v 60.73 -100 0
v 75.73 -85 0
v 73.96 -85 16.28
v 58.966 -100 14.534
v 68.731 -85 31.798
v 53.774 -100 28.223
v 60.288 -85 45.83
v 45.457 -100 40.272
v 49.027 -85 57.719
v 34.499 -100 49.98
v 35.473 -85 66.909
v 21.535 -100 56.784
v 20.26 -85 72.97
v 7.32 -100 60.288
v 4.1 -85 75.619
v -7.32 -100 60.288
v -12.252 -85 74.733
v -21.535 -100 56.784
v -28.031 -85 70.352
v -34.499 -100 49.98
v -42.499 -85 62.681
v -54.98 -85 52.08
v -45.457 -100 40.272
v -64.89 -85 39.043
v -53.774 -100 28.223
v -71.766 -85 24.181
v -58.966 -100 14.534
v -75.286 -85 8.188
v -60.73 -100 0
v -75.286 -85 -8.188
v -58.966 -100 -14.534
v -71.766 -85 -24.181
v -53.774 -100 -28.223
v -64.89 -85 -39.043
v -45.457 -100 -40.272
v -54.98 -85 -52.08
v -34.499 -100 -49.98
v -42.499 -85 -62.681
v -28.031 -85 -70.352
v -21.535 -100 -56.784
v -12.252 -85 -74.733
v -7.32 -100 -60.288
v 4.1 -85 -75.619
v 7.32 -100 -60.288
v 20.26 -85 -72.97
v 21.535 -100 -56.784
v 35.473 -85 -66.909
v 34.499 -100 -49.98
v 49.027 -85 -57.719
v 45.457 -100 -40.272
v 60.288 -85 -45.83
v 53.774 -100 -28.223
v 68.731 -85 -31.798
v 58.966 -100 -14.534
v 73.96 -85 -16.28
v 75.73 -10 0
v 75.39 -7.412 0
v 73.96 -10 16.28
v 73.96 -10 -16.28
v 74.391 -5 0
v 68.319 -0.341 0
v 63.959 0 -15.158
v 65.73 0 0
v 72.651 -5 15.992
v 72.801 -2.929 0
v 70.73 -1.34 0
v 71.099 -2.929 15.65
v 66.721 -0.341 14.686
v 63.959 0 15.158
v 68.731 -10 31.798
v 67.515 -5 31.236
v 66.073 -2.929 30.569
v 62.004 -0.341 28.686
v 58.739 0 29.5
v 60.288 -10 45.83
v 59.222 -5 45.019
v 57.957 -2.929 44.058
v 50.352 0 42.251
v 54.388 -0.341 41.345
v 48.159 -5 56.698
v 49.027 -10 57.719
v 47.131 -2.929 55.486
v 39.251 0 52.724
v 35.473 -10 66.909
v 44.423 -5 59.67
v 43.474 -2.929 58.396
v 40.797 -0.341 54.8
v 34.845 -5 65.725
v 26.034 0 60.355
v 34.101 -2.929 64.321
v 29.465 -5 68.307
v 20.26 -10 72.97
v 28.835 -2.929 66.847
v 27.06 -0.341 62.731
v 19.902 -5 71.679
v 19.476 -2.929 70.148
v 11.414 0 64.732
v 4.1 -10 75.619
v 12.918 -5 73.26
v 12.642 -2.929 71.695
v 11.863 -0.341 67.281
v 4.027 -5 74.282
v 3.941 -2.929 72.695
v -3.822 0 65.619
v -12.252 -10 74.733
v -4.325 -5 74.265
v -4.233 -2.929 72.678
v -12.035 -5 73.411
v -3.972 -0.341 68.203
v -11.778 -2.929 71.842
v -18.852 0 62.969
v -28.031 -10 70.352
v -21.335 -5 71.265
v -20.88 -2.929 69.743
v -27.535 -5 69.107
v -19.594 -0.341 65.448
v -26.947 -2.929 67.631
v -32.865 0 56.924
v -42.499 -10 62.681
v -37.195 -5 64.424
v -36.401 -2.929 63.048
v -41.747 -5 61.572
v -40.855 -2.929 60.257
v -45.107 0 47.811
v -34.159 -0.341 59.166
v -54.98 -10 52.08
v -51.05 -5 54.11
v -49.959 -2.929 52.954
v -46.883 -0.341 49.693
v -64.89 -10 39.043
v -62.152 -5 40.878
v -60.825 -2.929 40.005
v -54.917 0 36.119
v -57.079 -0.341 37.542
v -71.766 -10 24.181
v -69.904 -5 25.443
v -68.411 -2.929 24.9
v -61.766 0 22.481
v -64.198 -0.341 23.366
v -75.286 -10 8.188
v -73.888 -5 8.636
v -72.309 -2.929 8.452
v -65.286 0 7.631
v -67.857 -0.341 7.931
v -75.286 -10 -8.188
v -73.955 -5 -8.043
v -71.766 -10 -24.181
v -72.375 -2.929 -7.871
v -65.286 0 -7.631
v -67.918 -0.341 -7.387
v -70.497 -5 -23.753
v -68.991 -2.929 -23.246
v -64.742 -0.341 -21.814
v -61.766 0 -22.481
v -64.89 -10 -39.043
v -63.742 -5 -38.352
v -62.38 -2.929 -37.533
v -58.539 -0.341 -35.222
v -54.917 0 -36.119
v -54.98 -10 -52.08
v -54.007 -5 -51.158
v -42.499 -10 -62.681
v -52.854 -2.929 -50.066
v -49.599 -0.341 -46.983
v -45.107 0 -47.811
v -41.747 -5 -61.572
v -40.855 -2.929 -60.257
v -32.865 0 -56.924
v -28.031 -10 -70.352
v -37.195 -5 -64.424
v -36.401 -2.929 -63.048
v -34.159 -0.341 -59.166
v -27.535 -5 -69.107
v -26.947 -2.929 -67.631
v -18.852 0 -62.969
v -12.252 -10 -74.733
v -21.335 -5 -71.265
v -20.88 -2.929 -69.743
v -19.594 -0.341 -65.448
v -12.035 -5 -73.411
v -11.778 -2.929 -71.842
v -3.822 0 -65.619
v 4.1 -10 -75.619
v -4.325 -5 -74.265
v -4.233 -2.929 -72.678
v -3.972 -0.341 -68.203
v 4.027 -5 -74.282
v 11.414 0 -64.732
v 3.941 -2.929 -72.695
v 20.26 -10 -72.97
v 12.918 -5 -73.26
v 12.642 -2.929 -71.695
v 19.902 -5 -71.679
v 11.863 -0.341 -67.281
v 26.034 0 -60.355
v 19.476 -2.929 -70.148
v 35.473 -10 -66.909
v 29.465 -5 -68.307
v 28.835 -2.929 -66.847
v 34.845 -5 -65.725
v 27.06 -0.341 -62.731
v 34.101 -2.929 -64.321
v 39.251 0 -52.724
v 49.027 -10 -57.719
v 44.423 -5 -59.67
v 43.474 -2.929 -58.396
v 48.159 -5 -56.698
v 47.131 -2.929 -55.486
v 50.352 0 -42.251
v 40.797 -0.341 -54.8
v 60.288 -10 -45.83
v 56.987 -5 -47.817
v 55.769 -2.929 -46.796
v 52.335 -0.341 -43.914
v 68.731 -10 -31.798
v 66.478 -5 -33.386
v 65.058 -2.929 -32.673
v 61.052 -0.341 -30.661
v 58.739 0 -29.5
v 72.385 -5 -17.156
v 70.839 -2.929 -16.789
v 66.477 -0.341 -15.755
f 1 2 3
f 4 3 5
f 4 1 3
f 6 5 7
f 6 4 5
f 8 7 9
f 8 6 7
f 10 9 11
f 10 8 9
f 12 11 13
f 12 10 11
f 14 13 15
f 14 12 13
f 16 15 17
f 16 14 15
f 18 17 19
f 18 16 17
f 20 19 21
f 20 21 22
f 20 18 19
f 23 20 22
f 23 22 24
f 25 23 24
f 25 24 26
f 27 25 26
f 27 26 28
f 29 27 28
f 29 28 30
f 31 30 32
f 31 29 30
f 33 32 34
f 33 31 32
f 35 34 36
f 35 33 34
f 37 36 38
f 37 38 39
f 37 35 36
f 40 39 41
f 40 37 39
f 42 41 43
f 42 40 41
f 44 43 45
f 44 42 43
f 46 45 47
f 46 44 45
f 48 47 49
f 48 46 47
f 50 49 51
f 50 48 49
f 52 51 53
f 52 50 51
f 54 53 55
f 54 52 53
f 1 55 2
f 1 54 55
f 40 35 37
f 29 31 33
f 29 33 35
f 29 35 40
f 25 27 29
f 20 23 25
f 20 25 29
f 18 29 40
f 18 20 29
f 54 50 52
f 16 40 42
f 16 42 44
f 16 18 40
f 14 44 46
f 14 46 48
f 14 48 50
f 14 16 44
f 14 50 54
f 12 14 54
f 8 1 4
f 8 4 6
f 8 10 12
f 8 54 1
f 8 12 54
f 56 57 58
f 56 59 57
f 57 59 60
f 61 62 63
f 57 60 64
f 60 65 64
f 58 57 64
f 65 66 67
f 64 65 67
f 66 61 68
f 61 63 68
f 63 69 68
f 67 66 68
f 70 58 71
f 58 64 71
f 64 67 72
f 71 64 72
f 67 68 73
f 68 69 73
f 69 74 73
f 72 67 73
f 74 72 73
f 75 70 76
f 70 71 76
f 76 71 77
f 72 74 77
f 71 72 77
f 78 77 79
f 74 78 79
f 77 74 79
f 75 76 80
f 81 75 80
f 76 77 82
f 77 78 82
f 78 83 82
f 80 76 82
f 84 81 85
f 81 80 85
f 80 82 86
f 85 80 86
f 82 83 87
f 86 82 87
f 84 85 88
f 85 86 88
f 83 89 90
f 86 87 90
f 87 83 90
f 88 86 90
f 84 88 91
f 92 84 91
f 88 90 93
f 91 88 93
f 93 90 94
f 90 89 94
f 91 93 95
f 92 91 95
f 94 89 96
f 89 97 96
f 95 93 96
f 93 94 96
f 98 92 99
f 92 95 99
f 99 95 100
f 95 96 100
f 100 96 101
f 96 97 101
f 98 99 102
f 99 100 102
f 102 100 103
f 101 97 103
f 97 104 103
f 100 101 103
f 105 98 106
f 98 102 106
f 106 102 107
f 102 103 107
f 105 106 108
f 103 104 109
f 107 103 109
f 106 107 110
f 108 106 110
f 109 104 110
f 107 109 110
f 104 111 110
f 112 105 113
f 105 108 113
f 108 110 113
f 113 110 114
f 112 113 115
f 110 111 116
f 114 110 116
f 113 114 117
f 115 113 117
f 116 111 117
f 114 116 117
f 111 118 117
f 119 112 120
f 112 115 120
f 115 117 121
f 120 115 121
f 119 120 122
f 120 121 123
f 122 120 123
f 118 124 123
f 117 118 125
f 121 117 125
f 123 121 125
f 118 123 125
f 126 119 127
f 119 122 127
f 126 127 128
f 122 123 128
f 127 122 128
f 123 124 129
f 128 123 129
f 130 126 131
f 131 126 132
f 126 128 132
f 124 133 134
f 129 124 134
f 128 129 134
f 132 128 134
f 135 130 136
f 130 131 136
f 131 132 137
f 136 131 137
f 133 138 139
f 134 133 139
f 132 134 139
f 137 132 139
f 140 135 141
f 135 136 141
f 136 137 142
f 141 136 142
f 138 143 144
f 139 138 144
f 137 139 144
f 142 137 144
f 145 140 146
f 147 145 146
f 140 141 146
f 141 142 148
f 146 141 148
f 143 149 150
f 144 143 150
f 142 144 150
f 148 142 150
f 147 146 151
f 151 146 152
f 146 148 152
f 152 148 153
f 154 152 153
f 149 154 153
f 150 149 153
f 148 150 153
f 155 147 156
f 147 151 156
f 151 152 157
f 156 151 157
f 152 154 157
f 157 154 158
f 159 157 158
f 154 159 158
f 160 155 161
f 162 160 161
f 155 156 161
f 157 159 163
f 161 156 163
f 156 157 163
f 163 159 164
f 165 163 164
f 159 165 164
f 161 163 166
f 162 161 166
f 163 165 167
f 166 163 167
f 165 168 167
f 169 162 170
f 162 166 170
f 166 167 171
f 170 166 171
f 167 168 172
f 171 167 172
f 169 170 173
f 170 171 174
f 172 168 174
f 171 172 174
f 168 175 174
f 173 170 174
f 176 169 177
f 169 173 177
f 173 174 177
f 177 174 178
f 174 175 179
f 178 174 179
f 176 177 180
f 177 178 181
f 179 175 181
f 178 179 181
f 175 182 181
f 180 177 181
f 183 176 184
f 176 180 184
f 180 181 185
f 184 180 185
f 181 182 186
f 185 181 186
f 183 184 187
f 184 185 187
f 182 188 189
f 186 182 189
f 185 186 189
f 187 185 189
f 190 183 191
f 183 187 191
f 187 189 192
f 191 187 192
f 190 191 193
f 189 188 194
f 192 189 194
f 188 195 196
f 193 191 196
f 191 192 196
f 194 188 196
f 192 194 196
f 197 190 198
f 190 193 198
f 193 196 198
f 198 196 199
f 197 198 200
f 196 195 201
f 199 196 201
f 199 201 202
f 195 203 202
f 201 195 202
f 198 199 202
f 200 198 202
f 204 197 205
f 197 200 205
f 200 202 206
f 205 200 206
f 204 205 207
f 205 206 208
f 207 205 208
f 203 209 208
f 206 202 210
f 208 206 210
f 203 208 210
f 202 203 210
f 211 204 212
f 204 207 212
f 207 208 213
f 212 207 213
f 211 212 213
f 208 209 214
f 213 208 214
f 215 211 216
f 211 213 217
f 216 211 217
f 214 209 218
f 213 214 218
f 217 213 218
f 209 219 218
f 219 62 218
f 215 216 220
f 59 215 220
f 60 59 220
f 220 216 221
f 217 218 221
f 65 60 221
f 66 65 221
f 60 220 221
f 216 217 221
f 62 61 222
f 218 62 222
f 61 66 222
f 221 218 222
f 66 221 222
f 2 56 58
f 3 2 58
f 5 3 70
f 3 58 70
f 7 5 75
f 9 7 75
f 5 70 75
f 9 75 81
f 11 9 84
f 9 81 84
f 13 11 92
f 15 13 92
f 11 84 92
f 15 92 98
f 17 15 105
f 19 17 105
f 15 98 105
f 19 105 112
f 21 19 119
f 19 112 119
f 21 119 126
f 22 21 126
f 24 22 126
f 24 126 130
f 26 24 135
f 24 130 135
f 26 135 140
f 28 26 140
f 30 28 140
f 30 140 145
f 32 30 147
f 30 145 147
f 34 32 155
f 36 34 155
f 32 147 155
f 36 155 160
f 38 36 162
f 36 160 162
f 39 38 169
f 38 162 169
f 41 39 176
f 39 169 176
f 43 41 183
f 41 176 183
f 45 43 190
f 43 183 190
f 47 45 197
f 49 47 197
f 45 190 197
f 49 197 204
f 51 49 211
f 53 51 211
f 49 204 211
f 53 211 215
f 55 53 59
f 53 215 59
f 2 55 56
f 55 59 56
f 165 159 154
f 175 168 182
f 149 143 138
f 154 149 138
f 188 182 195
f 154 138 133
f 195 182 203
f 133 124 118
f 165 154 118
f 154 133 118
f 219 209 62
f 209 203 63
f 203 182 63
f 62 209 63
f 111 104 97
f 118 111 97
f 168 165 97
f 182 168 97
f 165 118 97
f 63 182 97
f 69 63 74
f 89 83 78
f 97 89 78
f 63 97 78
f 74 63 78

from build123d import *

# Parameters (mm, degrees)
F1_R     = 75.730372
F2_DEPTH = 100
F3_R     = 10
F4_SIZE  = 15


with BuildPart() as f2:
    # F1 (on face) → F2 (new body)
    with BuildSketch(Plane.XZ):
        Circle(F1_R)
    extrude(amount=F2_DEPTH)

    # F3
    f3_edges = [f2.edges().sort_by_distance(p)[0] for p in [
        (-75.730372, 0, 0),
    ]]
    fillet(f3_edges, radius=F3_R)

    # F4
    f4_edges = [f2.edges().sort_by_distance(p)[0] for p in [
        (-75.730372, -100, 0),
    ]]
    chamfer(f4_edges, length=F4_SIZE)


solid = f2.part
